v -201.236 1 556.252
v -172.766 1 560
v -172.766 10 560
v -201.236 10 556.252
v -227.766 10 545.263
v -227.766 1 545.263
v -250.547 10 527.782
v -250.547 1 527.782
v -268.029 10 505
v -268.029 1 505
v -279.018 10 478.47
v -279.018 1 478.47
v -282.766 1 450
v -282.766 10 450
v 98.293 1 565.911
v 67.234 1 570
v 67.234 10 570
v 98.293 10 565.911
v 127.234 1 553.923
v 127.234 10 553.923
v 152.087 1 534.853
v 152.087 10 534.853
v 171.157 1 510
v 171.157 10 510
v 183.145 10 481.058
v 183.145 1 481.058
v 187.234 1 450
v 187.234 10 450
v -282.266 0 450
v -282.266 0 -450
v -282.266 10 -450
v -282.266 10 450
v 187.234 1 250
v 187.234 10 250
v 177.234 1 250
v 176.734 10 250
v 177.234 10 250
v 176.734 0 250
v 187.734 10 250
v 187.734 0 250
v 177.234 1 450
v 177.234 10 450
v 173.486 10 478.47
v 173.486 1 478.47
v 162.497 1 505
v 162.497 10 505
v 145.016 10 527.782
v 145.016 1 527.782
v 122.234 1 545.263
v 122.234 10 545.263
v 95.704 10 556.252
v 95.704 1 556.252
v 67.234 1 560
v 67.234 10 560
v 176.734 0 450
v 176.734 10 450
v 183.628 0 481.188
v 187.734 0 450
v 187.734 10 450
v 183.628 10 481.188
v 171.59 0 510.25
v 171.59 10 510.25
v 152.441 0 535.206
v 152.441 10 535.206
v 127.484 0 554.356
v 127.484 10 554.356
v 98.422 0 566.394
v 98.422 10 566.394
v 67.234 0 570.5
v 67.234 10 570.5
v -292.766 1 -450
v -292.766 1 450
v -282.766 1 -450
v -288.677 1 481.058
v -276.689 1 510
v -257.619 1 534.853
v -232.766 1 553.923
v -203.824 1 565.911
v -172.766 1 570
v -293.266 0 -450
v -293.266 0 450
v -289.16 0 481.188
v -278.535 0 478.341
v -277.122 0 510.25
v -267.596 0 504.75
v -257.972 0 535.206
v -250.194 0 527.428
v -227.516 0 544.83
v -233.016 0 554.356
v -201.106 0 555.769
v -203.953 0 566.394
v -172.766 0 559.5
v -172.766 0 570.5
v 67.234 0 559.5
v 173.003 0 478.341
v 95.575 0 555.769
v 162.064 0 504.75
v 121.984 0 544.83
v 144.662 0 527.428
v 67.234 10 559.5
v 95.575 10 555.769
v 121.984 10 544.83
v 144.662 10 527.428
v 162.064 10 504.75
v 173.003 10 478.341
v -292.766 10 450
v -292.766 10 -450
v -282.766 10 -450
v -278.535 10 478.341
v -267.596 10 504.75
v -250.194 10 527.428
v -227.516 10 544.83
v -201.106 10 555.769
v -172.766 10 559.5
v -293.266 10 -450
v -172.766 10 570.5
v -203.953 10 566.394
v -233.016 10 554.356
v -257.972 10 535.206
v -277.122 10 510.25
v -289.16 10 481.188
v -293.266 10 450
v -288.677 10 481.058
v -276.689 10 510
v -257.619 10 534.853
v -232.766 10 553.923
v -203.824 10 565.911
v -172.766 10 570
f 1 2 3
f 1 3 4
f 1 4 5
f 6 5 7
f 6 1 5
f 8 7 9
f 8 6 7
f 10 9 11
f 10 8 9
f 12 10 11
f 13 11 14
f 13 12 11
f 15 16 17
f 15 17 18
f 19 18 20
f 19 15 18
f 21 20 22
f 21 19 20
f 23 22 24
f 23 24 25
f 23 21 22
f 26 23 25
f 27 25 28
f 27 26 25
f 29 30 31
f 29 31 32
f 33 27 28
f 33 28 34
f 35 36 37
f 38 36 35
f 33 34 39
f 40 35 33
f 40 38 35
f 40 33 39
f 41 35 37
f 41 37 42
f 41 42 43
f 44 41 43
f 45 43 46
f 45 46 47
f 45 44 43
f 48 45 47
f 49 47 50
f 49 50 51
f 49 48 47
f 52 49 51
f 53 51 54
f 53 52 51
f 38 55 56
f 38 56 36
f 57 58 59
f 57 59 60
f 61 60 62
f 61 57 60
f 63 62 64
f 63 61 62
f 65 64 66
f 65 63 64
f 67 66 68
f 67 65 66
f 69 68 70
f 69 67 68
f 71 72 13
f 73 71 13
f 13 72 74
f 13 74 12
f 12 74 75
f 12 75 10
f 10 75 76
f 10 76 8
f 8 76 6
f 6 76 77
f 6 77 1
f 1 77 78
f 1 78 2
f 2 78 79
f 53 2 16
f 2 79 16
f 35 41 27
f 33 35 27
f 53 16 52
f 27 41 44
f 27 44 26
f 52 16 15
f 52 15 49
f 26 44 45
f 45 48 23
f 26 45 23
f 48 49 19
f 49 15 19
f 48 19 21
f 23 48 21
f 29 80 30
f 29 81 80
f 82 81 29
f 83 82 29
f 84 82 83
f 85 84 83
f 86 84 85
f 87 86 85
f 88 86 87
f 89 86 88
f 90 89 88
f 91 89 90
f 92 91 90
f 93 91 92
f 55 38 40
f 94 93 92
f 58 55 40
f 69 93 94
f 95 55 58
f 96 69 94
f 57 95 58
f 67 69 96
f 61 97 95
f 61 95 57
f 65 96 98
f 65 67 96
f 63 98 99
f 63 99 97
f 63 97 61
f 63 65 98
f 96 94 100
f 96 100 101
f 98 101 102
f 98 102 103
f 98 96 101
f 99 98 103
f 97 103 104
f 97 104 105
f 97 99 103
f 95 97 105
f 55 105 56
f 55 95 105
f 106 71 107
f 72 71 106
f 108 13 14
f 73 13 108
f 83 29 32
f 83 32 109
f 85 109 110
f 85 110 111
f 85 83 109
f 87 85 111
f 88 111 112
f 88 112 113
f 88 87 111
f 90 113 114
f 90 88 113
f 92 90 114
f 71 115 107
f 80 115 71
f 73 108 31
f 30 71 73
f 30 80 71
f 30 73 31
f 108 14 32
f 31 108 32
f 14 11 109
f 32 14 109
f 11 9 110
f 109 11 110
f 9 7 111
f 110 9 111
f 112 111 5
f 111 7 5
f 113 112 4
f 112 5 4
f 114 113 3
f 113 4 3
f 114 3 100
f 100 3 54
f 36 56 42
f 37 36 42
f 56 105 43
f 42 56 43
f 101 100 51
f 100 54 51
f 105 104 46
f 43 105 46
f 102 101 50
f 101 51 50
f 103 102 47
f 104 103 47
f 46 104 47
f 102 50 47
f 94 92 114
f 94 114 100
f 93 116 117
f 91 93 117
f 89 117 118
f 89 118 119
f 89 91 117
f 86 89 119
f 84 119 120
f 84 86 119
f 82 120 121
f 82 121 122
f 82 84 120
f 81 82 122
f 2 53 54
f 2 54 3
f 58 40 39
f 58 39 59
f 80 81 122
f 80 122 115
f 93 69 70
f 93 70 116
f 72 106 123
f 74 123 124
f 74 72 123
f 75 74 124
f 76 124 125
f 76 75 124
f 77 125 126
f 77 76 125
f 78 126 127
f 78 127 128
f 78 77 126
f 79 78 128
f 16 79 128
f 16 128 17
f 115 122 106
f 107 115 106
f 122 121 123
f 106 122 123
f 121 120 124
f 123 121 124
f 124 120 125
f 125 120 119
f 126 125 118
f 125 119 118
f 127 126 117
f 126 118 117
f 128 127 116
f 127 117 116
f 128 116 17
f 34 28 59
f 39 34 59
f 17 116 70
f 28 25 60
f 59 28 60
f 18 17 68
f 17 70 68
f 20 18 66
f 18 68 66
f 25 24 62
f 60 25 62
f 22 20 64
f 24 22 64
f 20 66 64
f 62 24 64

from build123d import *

# Parameters (mm, degrees)
F1_DEPTH = 10
F2_DEPTH = 1
F3_DEPTH = 700


with BuildPart() as f1:
    # F0 (on Front) → F1 (new body)
    with BuildSketch(Plane.XZ):
        with BuildLine():
            Line((67.234268, 570.5), (-172.765732, 570.5))
            ThreePointArc((-172.765732, 570.5), (-257.972099, 535.206367), (-293.265732, 450))
            Line((-293.265732, 450), (-293.265732, -450))
            Line((-293.265732, -450), (-292.765732, -450))
            Line((-292.765732, -450), (-292.765732, 450))
            ThreePointArc((-292.765732, 450), (-257.618545, 534.852814), (-172.765732, 570))
            Line((-172.765732, 570), (67.234268, 570))
            ThreePointArc((67.234268, 570), (152.087082, 534.852814), (187.234268, 450))
            Line((187.234268, 450), (187.234268, -450))
            Line((187.234268, -450), (187.734268, -450))
            Line((187.734268, -450), (187.734268, 450))
            ThreePointArc((187.734268, 450), (152.440635, 535.206367), (67.234268, 570.5))
        make_face()
        with BuildLine():
            Line((-282.765732, 450), (-282.765732, -450))
            Line((-282.765732, -450), (-282.265732, -450))
            Line((-282.265732, -450), (-282.265732, 450))
            ThreePointArc((-282.265732, 450), (-250.193924, 527.428193), (-172.765732, 559.5))
            Line((-172.765732, 559.5), (67.234268, 559.5))
            ThreePointArc((67.234268, 559.5), (144.662461, 527.428193), (176.734268, 450))
            Line((176.734268, 450), (176.734268, -450))
            Line((176.734268, -450), (177.234268, -450))
            Line((177.234268, -450), (177.234268, 450))
            ThreePointArc((177.234268, 450), (145.016014, 527.781746), (67.234268, 560))
            Line((67.234268, 560), (-172.765732, 560))
            ThreePointArc((-172.765732, 560), (-250.547478, 527.781746), (-282.765732, 450))
        make_face()
    extrude(amount=-F1_DEPTH)

    # F0 (on Front) → F2 (join)
    with BuildSketch(Plane.XZ):
        with BuildLine():
            Line((-292.765732, 450), (-292.765732, -450))
            Line((-292.765732, -450), (-282.765732, -450))
            Line((-282.765732, -450), (-282.765732, 450))
            ThreePointArc((-282.765732, 450), (-250.547478, 527.781746), (-172.765732, 560))
            Line((-172.765732, 560), (67.234268, 560))
            ThreePointArc((67.234268, 560), (145.016014, 527.781746), (177.234268, 450))
            Line((177.234268, 450), (177.234268, -450))
            Line((177.234268, -450), (187.234268, -450))
            Line((187.234268, -450), (187.234268, 450))
            ThreePointArc((187.234268, 450), (152.087082, 534.852814), (67.234268, 570))
            Line((67.234268, 570), (-172.765732, 570))
            ThreePointArc((-172.765732, 570), (-257.618545, 534.852814), (-292.765732, 450))
        make_face()
    extrude(amount=-F2_DEPTH)

    # F2_face (on face) → F3 (cut)
    with BuildSketch(Plane(origin=(182.234268, 2.75, -450), x_dir=(1, 0, 0), z_dir=(0, 0, -1))):
        Polygon((5, 1.75), (5, -7.25), (5.5, -7.25), (5.5, 2.75), (-5.5, 2.75), (-5.5, -7.25), (-5, -7.25), (-5, 1.75), align=None)
    extrude(amount=-F3_DEPTH, mode=Mode.SUBTRACT)


solid = f1.part
